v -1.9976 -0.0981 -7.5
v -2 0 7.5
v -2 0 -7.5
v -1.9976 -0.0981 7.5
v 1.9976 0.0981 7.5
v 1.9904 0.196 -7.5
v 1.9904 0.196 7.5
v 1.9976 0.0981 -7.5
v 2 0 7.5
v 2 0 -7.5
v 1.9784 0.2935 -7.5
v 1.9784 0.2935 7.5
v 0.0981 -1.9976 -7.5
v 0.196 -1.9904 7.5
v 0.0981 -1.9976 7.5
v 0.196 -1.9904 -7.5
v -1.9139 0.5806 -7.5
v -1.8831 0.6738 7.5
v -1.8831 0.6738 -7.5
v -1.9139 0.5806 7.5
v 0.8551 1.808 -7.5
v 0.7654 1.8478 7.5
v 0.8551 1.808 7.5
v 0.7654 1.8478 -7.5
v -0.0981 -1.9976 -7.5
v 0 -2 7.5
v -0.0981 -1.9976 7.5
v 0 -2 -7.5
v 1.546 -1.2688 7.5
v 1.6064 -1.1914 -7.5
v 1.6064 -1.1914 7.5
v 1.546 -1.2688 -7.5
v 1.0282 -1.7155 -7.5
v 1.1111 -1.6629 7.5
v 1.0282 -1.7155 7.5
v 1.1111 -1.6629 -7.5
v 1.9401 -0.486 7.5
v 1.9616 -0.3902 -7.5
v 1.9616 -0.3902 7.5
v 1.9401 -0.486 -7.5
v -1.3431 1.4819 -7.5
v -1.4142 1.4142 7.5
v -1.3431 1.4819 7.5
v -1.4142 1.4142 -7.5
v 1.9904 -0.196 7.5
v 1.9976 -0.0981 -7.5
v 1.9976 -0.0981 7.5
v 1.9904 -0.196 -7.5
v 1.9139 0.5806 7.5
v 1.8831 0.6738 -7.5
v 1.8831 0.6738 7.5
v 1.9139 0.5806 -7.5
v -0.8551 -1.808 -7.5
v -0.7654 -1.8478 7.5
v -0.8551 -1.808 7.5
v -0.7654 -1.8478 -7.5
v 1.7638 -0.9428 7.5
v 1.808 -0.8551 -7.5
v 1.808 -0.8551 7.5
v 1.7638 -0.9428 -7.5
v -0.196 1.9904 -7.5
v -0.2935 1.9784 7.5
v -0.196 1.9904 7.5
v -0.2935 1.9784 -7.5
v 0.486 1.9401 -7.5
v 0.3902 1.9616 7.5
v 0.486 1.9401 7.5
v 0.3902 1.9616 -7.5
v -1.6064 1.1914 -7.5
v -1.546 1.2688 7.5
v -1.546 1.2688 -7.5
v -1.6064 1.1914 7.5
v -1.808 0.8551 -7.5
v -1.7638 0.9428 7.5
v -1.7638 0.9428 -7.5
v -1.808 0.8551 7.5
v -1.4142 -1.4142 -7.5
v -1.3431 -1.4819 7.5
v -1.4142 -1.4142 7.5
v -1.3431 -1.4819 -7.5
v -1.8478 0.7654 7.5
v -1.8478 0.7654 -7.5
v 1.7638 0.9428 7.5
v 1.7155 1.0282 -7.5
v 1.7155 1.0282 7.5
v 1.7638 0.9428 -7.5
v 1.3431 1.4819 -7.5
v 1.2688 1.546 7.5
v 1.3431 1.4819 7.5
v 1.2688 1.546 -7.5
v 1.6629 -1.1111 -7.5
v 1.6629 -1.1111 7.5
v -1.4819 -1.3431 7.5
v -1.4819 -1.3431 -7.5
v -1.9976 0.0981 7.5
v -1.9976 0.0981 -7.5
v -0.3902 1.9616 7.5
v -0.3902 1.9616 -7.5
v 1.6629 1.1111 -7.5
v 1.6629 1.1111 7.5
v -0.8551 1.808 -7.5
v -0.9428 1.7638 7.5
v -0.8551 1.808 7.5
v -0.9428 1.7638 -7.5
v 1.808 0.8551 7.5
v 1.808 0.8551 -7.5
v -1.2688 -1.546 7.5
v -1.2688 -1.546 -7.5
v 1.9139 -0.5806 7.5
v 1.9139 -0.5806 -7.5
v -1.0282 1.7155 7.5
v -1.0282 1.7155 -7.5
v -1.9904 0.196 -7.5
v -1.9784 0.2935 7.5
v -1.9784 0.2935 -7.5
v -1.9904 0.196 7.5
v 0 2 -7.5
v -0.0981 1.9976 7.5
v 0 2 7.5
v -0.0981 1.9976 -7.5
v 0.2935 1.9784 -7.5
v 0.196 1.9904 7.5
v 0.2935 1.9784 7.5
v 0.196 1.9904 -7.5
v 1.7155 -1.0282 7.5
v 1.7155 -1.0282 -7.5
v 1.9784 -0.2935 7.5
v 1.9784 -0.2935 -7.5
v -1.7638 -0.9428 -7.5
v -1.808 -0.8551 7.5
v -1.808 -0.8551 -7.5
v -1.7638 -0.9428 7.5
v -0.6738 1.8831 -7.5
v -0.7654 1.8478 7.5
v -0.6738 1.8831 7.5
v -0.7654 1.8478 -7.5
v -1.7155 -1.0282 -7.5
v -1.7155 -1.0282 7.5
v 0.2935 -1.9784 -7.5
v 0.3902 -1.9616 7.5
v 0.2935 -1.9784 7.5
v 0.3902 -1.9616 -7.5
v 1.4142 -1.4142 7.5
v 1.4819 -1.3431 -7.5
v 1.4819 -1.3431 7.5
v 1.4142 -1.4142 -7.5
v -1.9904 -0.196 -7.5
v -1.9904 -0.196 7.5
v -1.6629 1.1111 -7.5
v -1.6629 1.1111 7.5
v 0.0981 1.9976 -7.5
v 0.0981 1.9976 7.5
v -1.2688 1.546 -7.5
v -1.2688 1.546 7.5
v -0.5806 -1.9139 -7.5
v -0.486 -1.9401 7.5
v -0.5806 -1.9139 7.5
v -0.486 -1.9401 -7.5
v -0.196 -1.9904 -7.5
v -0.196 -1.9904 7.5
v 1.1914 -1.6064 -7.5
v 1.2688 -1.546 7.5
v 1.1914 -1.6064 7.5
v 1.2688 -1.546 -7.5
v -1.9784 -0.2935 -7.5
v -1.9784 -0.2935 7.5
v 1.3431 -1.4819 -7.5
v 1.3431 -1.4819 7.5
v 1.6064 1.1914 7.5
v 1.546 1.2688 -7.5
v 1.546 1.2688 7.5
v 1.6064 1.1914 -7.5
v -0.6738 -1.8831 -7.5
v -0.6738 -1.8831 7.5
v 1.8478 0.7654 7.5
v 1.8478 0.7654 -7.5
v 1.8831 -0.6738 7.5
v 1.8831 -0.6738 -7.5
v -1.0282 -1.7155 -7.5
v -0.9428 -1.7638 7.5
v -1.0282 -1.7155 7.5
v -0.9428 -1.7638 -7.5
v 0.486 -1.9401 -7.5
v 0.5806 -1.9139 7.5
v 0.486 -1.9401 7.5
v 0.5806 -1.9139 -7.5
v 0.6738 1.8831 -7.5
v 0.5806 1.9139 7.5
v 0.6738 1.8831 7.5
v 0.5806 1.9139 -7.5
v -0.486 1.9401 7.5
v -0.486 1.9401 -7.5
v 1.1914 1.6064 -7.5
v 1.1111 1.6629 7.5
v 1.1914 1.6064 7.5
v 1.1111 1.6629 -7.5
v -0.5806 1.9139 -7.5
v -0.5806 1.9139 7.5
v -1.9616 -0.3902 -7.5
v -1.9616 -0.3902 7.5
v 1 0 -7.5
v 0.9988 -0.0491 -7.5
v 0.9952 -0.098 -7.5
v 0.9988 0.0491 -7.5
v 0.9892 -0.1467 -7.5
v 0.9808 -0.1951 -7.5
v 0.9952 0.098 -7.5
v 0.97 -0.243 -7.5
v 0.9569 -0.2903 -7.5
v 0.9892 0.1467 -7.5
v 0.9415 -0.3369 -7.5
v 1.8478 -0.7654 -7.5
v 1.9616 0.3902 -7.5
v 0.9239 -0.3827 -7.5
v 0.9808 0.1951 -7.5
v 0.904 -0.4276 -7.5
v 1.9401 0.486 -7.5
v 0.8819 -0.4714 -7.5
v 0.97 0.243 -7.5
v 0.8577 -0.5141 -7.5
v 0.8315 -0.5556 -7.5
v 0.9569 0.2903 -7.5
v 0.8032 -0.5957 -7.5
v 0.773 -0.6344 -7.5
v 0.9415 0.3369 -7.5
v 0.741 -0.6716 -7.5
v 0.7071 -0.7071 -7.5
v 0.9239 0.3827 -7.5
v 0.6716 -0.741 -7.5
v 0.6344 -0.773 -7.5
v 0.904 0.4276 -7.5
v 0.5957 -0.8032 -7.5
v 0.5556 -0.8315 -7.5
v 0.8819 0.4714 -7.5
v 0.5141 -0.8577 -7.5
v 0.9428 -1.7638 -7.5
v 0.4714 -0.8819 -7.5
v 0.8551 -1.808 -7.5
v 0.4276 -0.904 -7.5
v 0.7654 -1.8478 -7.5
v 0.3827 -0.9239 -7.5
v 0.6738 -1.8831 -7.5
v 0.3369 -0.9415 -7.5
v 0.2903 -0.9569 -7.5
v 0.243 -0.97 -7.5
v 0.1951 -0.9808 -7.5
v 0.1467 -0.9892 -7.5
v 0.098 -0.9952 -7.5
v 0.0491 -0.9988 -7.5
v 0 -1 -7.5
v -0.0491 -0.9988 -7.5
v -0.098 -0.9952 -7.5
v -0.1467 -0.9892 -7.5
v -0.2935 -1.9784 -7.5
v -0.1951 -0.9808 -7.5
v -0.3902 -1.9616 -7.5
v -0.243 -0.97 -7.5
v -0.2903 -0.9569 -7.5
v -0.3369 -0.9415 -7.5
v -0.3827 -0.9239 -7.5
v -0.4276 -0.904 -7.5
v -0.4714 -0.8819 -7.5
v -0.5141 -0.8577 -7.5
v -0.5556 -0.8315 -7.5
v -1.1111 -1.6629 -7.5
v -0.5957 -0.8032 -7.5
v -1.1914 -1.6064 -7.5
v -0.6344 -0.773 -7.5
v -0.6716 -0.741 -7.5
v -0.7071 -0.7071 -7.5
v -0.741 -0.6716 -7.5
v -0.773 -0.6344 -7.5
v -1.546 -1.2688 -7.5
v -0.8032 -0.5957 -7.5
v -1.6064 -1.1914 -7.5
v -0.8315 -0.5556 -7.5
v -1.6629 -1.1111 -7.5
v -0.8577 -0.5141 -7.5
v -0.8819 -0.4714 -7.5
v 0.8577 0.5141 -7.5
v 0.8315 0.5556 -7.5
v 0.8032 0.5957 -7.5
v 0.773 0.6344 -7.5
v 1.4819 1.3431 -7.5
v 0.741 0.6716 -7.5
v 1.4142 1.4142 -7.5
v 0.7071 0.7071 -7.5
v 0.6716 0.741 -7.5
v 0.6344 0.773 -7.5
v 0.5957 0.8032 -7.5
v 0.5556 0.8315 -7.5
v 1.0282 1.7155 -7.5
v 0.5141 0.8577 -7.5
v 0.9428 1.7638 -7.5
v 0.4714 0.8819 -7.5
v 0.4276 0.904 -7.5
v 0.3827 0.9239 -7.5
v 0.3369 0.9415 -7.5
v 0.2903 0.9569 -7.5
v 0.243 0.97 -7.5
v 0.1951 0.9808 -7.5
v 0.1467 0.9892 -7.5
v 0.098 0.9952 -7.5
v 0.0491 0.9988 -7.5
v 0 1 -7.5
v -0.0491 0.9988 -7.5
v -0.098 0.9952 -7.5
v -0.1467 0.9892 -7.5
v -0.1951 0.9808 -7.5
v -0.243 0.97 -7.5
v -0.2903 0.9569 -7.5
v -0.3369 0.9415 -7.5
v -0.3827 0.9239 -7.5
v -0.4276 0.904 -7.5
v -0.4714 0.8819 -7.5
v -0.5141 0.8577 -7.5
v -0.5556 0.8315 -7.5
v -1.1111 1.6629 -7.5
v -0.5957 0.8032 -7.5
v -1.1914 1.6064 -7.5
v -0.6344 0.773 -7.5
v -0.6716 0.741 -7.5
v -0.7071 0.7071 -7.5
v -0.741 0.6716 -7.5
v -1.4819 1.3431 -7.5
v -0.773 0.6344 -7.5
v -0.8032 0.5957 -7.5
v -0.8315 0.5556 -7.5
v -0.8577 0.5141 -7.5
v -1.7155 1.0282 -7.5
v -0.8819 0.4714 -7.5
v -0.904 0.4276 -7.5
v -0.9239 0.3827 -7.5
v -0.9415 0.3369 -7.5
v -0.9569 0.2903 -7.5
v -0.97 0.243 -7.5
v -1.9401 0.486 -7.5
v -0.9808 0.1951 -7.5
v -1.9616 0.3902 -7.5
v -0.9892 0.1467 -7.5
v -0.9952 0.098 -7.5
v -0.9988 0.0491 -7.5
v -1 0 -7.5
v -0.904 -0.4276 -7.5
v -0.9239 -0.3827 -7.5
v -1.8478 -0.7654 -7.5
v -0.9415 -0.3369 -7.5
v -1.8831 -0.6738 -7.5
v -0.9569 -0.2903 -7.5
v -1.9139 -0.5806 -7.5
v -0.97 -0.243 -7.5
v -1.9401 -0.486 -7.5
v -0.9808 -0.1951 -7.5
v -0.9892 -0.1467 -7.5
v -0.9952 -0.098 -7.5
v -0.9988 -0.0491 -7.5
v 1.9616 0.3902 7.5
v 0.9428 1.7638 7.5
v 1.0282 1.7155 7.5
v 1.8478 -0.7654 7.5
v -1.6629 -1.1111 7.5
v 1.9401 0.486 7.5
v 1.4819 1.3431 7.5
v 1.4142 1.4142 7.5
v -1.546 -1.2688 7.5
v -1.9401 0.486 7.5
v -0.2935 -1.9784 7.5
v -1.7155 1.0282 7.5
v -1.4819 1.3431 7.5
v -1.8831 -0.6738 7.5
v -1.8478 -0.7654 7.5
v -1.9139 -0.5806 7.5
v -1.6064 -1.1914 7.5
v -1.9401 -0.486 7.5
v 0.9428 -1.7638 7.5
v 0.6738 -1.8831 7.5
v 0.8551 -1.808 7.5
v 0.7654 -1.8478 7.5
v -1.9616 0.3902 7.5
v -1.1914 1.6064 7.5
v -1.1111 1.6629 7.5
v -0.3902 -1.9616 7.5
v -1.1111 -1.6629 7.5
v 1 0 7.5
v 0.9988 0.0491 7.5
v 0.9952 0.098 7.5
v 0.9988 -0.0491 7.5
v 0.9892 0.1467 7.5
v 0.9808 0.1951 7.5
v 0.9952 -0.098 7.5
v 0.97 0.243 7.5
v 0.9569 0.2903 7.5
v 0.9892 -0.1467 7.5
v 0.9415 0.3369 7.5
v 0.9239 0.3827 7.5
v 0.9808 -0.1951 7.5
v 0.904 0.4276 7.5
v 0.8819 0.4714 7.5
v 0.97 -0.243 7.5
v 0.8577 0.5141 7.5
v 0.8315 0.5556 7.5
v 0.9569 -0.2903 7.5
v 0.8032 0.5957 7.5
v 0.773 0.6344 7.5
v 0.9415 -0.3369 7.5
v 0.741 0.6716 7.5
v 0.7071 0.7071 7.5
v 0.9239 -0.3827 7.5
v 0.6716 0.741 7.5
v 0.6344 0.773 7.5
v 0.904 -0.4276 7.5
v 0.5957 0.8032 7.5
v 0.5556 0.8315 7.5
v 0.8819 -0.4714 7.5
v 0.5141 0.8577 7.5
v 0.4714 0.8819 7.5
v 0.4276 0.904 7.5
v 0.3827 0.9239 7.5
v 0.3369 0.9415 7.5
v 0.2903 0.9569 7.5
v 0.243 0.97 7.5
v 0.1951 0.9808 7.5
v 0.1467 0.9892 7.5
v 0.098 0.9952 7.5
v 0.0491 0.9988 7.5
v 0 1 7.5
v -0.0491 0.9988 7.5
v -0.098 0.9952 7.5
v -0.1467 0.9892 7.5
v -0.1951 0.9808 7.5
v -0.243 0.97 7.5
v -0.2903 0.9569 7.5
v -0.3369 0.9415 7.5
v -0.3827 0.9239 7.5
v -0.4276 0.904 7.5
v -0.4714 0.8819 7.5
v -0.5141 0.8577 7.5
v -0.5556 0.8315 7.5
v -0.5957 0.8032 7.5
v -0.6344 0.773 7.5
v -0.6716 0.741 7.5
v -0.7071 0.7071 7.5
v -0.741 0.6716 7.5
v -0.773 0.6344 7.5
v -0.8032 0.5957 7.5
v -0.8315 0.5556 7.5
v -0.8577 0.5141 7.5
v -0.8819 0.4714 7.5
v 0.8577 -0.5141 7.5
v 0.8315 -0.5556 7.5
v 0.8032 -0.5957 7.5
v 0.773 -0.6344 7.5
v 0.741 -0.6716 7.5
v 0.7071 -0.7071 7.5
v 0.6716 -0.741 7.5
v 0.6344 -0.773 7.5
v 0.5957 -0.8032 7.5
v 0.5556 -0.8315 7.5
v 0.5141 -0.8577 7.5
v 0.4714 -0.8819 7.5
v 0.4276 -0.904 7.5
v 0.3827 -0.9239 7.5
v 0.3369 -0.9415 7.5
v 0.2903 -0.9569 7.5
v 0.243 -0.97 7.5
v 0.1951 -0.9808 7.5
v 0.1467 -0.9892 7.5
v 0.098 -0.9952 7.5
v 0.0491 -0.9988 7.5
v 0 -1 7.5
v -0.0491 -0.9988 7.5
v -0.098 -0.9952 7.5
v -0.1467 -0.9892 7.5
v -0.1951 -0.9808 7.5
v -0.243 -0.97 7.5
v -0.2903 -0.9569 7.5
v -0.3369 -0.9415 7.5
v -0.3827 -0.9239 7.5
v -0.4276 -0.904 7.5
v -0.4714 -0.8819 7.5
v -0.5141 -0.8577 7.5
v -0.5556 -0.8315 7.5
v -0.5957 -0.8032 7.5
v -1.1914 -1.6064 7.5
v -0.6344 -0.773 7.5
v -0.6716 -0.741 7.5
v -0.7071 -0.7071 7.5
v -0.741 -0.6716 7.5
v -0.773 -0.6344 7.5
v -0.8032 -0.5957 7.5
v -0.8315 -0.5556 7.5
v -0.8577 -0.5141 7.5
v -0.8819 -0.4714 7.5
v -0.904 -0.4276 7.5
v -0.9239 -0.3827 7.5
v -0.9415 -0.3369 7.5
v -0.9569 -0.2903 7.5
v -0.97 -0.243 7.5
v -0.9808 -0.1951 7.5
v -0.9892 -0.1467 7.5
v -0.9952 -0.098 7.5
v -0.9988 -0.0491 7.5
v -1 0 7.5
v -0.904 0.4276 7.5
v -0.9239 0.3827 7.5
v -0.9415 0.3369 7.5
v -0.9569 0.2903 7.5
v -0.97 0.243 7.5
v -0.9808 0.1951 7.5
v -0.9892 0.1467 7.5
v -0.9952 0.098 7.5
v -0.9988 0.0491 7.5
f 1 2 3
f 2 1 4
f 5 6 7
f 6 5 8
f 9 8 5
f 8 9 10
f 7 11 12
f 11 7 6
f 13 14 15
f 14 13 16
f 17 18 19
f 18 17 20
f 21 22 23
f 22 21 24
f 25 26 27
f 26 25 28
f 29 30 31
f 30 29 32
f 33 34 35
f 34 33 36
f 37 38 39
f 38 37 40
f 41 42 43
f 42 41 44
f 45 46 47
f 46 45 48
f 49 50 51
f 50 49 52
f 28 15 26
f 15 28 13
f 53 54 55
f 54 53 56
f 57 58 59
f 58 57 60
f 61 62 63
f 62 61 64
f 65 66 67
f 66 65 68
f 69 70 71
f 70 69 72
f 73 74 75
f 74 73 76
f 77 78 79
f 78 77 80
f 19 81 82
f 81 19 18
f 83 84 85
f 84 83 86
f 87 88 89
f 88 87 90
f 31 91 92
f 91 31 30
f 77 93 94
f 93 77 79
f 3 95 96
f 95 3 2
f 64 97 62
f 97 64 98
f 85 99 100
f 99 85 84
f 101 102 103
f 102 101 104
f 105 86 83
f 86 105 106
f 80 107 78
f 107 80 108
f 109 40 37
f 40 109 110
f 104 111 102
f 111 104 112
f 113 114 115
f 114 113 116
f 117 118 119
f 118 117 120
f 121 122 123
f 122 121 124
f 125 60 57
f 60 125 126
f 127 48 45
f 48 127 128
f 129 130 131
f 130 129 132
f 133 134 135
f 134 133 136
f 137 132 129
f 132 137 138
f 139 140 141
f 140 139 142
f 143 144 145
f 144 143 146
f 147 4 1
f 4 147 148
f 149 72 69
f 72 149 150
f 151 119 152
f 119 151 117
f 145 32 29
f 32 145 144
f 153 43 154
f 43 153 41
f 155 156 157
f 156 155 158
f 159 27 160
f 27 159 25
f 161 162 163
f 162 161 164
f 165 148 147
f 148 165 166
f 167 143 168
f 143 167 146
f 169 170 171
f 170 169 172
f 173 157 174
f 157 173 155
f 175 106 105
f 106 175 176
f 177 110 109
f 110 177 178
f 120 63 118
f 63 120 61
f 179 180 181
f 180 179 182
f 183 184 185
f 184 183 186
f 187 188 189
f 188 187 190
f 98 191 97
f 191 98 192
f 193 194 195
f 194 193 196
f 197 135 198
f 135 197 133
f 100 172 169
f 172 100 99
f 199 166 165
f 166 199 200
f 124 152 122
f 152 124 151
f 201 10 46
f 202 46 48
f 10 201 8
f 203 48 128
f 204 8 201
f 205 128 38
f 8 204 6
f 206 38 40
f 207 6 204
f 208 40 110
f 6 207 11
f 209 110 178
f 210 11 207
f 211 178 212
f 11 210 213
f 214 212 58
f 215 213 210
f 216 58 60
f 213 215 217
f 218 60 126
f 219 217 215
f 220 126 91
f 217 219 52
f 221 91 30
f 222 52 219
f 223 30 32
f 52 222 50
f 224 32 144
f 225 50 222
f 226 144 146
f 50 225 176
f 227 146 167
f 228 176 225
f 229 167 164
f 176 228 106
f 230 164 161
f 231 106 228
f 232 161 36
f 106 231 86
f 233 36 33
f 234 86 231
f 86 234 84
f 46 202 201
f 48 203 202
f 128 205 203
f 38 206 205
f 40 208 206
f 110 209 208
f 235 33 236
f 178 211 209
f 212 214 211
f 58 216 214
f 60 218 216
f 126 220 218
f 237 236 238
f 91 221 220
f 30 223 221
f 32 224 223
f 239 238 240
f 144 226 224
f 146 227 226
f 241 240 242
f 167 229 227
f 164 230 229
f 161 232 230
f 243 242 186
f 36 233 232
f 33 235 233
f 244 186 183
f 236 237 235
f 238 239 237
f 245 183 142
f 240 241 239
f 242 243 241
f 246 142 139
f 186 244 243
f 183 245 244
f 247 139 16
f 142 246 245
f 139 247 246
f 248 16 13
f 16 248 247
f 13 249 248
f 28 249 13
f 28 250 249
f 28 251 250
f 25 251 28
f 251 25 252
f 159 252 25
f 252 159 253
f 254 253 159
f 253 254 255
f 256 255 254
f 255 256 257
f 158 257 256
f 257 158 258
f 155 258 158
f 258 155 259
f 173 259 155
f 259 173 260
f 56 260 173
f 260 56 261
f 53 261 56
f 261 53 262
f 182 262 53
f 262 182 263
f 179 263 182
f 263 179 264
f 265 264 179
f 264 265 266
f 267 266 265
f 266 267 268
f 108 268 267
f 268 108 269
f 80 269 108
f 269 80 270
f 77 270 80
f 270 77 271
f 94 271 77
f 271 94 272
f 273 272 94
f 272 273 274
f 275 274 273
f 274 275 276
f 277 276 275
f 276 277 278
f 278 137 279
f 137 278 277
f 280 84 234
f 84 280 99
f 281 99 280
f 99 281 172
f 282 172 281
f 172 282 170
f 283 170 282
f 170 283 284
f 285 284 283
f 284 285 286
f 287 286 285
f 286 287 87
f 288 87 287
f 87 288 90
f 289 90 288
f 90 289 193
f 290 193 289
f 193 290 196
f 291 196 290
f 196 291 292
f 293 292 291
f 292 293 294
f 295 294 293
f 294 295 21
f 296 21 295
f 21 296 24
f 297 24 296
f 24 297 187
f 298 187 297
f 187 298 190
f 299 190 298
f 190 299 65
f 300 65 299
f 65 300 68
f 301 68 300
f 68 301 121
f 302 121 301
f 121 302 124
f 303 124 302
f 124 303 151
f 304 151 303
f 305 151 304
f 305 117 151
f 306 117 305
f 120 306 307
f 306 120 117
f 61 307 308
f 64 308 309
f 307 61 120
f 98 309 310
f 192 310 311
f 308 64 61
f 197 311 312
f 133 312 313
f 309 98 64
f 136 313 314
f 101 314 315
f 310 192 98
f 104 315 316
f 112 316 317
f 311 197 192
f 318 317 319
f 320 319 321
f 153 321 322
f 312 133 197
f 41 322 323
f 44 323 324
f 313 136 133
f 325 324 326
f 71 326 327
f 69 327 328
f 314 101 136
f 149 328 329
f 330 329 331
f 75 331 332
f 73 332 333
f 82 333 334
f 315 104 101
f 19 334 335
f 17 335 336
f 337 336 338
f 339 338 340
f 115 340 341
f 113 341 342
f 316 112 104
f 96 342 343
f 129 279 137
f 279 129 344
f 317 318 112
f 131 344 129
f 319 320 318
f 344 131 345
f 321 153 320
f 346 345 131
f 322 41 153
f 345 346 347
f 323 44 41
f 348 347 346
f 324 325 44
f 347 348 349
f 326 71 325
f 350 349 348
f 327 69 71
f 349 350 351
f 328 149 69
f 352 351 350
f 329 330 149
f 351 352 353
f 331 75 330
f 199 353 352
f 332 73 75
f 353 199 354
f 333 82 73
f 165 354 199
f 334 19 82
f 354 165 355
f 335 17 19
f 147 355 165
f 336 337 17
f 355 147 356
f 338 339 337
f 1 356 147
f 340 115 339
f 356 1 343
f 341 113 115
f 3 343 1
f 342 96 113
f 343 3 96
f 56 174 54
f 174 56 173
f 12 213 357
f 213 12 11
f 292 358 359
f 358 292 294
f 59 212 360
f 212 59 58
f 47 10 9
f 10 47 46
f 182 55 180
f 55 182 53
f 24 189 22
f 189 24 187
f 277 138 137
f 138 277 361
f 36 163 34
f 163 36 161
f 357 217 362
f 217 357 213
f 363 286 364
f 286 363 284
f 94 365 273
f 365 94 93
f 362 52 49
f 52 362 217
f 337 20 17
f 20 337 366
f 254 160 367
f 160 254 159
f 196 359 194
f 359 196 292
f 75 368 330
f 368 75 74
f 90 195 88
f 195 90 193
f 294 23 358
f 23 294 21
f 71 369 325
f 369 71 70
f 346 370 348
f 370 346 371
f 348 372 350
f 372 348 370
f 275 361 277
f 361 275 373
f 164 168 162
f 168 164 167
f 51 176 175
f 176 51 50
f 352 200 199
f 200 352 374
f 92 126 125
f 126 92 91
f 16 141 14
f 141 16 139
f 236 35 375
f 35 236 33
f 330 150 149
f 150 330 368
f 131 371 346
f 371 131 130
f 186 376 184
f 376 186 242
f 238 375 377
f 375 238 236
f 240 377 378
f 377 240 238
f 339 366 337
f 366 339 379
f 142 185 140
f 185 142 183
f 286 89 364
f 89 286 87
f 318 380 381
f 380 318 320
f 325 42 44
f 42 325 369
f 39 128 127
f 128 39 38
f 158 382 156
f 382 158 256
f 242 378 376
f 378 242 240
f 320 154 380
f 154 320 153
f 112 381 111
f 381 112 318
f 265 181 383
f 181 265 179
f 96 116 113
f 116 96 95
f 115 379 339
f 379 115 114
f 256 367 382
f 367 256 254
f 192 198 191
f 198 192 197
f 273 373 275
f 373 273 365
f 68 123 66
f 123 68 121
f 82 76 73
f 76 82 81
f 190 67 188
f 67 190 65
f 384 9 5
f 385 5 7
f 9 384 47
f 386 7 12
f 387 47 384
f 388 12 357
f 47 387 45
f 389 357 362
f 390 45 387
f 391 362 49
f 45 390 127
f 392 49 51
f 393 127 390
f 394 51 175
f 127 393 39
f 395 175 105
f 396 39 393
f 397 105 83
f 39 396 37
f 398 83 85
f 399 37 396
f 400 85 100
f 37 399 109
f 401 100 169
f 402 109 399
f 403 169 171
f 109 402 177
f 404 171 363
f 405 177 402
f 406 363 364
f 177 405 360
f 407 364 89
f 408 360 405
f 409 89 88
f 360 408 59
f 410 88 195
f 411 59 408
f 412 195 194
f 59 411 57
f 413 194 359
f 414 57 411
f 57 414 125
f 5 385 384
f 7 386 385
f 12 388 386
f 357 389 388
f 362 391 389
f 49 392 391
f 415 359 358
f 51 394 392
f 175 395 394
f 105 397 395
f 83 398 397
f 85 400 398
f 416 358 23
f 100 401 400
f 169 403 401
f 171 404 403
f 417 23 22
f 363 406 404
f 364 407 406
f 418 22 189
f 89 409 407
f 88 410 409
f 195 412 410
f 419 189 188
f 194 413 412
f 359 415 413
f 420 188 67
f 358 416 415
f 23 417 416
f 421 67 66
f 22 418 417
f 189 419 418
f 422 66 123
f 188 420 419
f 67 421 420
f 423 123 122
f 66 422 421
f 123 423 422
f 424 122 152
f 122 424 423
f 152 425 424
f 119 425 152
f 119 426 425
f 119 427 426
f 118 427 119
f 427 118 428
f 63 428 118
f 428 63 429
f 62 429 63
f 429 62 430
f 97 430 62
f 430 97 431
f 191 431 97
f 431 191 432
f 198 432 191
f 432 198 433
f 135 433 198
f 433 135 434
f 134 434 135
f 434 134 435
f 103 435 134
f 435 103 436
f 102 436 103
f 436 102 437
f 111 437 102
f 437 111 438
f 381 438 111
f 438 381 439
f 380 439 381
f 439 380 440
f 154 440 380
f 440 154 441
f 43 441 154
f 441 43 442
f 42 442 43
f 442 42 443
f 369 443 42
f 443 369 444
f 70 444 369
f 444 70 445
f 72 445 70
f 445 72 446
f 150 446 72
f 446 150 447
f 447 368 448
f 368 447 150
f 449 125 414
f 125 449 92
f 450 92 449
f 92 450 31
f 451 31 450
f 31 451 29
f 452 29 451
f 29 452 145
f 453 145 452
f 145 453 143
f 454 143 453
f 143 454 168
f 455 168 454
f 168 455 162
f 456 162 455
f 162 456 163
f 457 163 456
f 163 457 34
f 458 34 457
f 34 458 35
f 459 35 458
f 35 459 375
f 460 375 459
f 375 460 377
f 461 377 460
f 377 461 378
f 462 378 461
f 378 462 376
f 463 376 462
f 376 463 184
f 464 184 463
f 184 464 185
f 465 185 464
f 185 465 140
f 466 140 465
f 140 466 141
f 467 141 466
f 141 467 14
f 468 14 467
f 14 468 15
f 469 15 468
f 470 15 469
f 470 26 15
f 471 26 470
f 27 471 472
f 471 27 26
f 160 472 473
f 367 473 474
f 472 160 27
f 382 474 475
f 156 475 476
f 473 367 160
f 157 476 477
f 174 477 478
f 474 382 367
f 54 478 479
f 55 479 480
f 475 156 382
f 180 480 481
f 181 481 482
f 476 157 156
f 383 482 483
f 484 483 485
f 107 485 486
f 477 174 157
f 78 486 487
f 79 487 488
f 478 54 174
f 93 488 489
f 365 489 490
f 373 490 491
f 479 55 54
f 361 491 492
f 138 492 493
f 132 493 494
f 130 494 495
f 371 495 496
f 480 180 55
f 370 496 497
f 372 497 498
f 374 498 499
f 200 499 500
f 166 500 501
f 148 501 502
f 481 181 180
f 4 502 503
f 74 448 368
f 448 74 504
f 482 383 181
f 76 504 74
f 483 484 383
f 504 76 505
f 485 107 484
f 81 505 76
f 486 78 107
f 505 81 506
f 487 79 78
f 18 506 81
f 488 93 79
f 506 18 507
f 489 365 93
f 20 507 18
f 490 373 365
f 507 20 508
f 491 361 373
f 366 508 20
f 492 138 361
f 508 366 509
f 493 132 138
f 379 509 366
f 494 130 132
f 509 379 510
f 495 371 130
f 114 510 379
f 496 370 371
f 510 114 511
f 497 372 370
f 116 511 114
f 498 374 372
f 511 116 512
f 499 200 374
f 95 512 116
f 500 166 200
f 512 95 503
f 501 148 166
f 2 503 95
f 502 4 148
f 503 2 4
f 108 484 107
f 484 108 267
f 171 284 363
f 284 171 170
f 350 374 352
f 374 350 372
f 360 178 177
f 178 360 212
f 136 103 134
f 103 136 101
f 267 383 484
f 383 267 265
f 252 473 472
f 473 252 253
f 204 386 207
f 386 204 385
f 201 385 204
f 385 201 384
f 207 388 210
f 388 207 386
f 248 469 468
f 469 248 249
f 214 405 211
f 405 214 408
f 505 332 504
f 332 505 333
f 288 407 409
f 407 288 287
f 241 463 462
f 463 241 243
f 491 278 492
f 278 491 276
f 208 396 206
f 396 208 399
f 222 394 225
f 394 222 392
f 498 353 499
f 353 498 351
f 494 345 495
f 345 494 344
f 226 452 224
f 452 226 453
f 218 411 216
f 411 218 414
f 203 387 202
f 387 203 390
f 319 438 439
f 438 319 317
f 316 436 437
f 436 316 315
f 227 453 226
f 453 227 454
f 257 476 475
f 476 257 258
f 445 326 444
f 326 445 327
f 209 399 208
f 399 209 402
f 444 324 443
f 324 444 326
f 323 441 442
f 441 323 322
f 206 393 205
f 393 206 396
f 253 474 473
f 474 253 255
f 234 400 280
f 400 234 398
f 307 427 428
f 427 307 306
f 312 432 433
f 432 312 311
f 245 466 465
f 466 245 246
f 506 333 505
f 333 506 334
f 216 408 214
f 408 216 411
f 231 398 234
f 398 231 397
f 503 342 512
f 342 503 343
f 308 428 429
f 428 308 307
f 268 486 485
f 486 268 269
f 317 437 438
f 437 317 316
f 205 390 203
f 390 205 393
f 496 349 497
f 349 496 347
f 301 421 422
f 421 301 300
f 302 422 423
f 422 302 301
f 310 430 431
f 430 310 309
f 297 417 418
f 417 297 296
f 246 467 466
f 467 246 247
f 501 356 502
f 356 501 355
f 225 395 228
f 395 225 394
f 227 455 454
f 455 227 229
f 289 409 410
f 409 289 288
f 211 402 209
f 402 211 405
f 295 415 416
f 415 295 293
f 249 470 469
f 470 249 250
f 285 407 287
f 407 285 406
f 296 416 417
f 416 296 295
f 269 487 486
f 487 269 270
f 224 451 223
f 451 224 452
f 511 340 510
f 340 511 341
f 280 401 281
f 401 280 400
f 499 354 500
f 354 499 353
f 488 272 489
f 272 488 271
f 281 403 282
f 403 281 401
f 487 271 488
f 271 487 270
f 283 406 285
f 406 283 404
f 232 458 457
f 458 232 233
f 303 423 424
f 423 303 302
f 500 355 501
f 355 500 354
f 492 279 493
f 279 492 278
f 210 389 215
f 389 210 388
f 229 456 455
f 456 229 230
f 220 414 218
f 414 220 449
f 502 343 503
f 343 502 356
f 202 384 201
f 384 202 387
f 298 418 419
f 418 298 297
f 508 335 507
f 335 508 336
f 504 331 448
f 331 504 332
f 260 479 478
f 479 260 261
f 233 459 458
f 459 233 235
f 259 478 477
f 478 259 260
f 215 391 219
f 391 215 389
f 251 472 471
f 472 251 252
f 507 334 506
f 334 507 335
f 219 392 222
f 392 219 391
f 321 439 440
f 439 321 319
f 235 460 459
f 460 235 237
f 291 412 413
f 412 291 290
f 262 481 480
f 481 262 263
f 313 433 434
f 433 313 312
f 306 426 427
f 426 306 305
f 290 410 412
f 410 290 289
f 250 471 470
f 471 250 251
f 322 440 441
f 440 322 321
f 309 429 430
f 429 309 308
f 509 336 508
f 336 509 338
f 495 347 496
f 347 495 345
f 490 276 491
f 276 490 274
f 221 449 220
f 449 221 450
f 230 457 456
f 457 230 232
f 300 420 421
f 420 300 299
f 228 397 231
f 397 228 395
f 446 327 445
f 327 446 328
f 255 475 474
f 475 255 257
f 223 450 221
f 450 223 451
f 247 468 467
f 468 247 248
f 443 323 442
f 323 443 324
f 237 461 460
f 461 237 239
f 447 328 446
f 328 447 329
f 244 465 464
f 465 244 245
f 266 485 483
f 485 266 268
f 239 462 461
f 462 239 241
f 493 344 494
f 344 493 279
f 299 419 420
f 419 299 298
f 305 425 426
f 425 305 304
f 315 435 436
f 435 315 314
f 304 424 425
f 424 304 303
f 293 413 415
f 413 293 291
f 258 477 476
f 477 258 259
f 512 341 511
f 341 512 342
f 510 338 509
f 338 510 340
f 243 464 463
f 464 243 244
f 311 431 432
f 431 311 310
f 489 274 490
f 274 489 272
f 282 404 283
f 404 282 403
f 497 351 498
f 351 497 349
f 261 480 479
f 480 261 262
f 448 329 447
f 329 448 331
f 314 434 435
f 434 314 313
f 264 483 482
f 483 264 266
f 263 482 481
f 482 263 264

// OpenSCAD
// Parameters
length = 15; //[8:30:1]
center = 1; //[0:1:1]
outer_diameter = 4; //[2:8:0.1]
inner_diameter = 2; //[1:6:0.1]
forced_id = 0; //[0:6:0.1]
eps = 0.2; //[0.01:1:0.01]

// Smoothness for circular PTFE tube
$fn = 128;

module tubing() {
  od = max(outer_diameter, 0.01);
  id_req = (forced_id > 0) ? forced_id : inner_diameter;

  // Ensure a valid, non-degenerate wall thickness
  min_wall = 0.2;
  id = min(max(id_req, 0), max(od - 2*min_wall, 0));

  // Avoid coincident faces by slightly extending the cutter
  cut_h = length + 2*max(eps, 0.01);

  color([0.85, 0.85, 0.8])
  difference() {
    cylinder(h=length, r=od/2, center=true);
    cylinder(h=cut_h, r=id/2, center=true);
  }
}

module assembly() {
  zoff = (center == 1) ? 0 : (length/2);
  translate([0, 0, zoff]) tubing();
}

assembly();
